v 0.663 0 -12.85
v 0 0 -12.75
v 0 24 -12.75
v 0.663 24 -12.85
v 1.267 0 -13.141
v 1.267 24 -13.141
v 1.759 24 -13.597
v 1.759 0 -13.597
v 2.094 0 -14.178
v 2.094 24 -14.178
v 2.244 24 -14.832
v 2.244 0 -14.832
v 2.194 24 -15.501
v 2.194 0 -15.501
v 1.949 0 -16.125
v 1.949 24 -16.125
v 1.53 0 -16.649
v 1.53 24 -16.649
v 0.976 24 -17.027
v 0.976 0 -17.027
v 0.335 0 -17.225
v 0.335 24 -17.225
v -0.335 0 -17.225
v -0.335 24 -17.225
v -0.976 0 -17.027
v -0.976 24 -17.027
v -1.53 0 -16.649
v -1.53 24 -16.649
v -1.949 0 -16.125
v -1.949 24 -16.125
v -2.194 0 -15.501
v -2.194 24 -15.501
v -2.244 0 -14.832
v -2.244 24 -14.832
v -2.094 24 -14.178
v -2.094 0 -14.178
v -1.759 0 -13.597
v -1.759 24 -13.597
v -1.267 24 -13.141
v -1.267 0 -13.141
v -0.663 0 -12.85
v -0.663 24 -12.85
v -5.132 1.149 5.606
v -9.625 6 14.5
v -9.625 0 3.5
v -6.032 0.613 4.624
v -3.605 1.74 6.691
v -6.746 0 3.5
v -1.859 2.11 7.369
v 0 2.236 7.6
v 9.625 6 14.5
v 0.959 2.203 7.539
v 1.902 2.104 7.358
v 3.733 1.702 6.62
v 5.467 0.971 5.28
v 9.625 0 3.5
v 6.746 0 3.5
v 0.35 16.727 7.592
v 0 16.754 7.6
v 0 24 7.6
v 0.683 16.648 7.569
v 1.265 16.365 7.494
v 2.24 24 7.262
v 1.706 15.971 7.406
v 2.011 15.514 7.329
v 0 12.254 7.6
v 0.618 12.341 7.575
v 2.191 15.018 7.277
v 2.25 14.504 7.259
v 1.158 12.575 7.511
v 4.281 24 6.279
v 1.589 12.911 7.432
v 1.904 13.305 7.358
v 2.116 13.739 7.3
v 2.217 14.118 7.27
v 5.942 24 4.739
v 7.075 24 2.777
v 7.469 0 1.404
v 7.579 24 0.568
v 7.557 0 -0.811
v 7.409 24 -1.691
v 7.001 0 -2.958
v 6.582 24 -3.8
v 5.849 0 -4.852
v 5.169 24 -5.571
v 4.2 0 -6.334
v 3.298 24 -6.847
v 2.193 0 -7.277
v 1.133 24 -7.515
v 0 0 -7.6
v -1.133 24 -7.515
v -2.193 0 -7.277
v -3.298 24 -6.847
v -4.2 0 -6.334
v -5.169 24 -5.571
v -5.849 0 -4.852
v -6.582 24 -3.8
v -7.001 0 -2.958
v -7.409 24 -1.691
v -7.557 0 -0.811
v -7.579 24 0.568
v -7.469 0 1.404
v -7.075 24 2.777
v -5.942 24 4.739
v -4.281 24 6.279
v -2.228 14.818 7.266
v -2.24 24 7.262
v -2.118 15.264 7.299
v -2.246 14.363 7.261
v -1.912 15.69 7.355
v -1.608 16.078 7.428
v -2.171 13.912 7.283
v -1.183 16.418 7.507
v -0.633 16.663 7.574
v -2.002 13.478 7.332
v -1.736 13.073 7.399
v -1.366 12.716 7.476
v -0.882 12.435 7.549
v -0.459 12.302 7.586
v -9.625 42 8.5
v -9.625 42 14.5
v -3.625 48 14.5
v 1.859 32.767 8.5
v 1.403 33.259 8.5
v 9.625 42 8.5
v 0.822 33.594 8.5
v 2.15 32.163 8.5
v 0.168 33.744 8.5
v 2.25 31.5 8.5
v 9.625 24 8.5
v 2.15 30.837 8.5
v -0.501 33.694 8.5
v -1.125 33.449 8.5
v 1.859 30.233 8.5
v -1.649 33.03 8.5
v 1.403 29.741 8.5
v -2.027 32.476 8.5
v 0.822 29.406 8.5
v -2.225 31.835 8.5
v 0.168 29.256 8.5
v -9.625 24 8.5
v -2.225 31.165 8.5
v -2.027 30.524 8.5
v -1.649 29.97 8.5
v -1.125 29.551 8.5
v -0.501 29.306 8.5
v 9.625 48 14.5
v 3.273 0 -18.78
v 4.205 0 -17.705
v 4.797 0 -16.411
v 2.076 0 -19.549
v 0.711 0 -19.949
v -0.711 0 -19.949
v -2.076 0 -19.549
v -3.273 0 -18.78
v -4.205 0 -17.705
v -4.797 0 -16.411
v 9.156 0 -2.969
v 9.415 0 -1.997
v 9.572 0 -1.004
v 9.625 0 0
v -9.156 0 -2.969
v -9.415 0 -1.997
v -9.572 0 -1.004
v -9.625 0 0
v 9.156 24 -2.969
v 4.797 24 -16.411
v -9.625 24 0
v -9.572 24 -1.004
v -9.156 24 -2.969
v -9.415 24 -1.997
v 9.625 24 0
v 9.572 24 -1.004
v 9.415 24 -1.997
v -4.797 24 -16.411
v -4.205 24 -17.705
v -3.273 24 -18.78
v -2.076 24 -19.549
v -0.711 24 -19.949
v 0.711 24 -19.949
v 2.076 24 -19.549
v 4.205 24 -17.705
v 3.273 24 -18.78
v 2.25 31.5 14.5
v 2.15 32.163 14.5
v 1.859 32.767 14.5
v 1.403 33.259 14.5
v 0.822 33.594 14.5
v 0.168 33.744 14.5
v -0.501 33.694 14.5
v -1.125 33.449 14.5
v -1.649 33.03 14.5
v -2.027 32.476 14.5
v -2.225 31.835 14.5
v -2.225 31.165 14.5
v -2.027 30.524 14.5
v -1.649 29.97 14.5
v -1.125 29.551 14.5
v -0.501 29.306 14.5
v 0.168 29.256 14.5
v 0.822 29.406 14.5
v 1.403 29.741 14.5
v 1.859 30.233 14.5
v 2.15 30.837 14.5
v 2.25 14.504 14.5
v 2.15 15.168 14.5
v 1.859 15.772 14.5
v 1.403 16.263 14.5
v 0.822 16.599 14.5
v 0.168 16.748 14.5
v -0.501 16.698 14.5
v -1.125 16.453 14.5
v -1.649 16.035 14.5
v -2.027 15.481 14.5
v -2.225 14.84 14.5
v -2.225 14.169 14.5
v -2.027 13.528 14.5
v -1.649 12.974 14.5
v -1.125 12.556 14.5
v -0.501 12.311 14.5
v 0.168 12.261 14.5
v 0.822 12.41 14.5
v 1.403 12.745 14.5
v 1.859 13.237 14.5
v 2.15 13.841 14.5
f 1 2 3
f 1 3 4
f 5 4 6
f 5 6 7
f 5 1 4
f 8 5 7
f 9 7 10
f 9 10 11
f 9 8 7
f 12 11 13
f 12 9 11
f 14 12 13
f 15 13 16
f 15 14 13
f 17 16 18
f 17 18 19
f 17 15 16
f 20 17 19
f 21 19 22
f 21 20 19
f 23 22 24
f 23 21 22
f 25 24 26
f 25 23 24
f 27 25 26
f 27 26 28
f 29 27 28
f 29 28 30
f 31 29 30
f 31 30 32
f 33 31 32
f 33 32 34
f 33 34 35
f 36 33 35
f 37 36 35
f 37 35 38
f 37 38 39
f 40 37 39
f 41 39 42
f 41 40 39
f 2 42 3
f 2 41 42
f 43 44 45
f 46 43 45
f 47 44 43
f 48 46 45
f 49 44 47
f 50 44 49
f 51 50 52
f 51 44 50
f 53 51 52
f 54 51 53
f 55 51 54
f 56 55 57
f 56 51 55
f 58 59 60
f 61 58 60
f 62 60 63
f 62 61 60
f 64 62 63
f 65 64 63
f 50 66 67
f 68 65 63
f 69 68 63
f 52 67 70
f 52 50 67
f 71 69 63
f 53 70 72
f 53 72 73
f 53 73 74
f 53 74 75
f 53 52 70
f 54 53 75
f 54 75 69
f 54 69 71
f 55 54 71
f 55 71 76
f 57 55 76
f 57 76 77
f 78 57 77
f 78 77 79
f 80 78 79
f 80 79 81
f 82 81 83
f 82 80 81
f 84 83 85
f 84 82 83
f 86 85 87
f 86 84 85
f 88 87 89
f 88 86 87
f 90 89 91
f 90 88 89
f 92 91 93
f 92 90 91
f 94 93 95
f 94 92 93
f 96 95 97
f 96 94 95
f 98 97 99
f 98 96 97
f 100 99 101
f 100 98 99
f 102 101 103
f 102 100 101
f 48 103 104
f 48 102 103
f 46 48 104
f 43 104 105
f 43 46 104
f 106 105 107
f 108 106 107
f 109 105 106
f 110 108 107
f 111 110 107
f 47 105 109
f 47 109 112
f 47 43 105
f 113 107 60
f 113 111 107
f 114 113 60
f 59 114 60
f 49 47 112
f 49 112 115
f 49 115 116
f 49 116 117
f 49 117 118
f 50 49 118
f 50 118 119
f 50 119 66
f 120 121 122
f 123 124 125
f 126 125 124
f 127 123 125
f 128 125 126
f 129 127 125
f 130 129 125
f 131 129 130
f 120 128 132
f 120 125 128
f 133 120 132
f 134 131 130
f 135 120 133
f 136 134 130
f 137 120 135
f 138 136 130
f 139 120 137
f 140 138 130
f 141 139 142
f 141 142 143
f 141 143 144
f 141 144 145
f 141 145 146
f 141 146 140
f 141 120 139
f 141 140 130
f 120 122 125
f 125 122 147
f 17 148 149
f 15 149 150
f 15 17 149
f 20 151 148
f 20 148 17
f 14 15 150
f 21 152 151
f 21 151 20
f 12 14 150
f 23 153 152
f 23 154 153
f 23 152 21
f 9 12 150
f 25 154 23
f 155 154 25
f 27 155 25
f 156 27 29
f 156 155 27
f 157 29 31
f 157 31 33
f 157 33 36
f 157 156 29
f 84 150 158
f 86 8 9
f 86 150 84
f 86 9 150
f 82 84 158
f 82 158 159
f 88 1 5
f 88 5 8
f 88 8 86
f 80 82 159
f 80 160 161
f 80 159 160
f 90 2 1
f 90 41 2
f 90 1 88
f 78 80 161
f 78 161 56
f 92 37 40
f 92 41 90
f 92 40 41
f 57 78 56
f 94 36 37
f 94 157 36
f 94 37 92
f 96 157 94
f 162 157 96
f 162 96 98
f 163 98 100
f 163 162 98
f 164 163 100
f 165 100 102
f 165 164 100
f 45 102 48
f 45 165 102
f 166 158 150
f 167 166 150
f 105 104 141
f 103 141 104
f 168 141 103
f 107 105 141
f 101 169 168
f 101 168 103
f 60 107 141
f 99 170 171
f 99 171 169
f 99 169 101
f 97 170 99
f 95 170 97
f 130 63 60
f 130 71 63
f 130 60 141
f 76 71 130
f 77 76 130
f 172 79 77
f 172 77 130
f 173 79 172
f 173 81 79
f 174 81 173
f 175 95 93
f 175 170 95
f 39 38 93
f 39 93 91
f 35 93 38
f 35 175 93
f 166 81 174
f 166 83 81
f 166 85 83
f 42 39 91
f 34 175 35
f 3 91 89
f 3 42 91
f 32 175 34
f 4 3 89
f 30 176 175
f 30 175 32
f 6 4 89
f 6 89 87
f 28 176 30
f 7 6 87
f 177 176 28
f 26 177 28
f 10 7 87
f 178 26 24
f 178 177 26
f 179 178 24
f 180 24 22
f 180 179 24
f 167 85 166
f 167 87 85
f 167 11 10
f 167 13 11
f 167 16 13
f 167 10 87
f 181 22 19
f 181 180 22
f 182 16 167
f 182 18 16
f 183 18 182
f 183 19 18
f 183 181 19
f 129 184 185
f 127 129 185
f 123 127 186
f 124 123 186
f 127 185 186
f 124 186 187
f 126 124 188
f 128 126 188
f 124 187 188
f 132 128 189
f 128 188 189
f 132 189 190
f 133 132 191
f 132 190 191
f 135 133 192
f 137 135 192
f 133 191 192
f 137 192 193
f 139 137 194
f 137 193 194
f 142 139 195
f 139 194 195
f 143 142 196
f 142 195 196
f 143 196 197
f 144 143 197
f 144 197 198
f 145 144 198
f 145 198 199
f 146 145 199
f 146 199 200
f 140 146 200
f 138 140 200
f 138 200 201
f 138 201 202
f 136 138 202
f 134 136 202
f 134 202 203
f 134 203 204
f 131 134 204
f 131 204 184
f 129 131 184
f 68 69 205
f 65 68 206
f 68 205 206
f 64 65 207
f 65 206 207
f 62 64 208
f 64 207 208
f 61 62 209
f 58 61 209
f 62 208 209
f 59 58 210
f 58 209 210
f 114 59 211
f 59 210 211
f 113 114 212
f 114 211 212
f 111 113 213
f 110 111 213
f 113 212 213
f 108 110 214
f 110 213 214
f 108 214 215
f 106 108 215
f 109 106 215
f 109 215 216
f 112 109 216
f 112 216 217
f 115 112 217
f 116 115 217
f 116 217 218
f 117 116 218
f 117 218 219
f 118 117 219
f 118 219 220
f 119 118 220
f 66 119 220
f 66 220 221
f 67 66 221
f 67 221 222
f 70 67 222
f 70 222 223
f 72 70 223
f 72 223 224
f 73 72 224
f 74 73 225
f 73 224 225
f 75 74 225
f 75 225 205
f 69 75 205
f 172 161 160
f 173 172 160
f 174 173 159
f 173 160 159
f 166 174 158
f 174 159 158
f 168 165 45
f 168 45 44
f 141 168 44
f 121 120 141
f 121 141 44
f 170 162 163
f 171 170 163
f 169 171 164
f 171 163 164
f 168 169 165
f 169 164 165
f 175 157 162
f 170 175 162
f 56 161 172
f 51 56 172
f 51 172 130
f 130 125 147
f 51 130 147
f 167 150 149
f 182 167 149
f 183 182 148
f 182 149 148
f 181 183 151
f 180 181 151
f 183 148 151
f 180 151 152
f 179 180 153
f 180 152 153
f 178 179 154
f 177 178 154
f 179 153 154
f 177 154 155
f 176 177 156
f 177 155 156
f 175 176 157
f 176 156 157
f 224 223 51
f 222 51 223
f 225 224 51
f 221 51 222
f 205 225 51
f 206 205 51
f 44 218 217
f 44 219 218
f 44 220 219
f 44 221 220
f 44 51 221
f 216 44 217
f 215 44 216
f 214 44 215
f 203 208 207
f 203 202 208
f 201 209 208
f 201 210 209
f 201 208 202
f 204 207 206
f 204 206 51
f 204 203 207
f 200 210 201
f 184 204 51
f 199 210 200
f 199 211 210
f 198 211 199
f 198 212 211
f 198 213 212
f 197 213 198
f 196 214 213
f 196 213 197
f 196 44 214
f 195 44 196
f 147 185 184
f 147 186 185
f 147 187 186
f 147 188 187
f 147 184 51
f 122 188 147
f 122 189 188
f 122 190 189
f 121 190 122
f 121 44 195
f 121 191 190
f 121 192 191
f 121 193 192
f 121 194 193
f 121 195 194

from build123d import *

# Parameters (mm, degrees)
SKETCH1_R           = 7.6
SKETCH1_R_2         = 2.25
BOSS_EXTRUDE1_DEPTH = 24
BOSS_EXTRUDE2_DEPTH = 19.25
CUT_EXTRUDE1_DEPTH  = 56.448737587
CHAMFER1_SIZE       = 6
SKETCH6_R           = 2.25
CUT_EXTRUDE3_DEPTH  = 16
CHAMFER2_SIZE       = 6


with BuildPart() as part:
    # Sketch1 → Boss-Extrude1 (new body)
    with BuildSketch(Plane(origin=(0, 0, 0), x_dir=(1, 0, 0), z_dir=(0, 1, 0))):
        with BuildLine():
            Line((-9.625, -8.5), (9.625, -8.5))
            Line((9.625, -8.5), (9.625, 0))
            ThreePointArc((9.625, 0), (9.506941676, 1.502892202), (9.155662863, 2.968916054))
            Line((9.155662863, 2.968916054), (4.796712187, 16.411223653))
            ThreePointArc((4.796712187, 16.411223653), (0, 20), (-4.796712187, 16.411223653))
            Line((-4.796712187, 16.411223653), (-9.155662863, 2.968916054))
            ThreePointArc((-9.155662863, 2.968916054), (-9.506941676, 1.502892202), (-9.625, 0))
            Line((-9.625, 0), (-9.625, -8.5))
        make_face()
        with Locations(Location((0, 0, 0), (0, 0, 270))):
            Circle(SKETCH1_R, mode=Mode.SUBTRACT)
        with Locations(Location((0, 15, 0), (0, 0, 270))):
            Circle(SKETCH1_R_2, mode=Mode.SUBTRACT)
    extrude(amount=BOSS_EXTRUDE1_DEPTH)

    # Sketch3 → Boss-Extrude2 (add)
    with BuildSketch(Plane.ZY.offset(9.625)):
        Polygon((8.5, 0), (14.5, 0), (14.5, 48), (8.5, 48), (8.5, 24), align=None)
    extrude(amount=-BOSS_EXTRUDE2_DEPTH)

    # Sketch4 → Cut-Extrude1 (cut, through all)
    with BuildSketch(Plane(origin=(9.625, 0, 0), x_dir=(0, 0, -1), z_dir=(1, 0, 0))):
        Polygon((-14.5, 0), (-14.5, 6), (-3.5, 0), align=None)
    extrude(amount=-CUT_EXTRUDE1_DEPTH, mode=Mode.SUBTRACT)

    # Chamfer1
    chamfer1_edges = [part.edges().sort_by_distance(p)[0] for p in [
        (-9.625, 48, 11.5),
    ]]
    chamfer(chamfer1_edges, length=CHAMFER1_SIZE)

    # Sketch6 → Cut-Extrude3 (cut)
    with BuildSketch(Plane.XY.offset(14.5)):
        with Locations((0, 14.504303095)):
            Circle(SKETCH6_R)
        with Locations((0, 31.5)):
            Circle(SKETCH6_R)
    extrude(amount=-CUT_EXTRUDE3_DEPTH, mode=Mode.SUBTRACT)

    # Chamfer2
    chamfer2_edges = [part.edges().sort_by_distance(p)[0] for p in [
        (3, 48, 8.5),
    ]]
    chamfer(chamfer2_edges, length=CHAMFER2_SIZE - 0.0001)  # a hair under: the kernel refuses the full size


solid = part.part
